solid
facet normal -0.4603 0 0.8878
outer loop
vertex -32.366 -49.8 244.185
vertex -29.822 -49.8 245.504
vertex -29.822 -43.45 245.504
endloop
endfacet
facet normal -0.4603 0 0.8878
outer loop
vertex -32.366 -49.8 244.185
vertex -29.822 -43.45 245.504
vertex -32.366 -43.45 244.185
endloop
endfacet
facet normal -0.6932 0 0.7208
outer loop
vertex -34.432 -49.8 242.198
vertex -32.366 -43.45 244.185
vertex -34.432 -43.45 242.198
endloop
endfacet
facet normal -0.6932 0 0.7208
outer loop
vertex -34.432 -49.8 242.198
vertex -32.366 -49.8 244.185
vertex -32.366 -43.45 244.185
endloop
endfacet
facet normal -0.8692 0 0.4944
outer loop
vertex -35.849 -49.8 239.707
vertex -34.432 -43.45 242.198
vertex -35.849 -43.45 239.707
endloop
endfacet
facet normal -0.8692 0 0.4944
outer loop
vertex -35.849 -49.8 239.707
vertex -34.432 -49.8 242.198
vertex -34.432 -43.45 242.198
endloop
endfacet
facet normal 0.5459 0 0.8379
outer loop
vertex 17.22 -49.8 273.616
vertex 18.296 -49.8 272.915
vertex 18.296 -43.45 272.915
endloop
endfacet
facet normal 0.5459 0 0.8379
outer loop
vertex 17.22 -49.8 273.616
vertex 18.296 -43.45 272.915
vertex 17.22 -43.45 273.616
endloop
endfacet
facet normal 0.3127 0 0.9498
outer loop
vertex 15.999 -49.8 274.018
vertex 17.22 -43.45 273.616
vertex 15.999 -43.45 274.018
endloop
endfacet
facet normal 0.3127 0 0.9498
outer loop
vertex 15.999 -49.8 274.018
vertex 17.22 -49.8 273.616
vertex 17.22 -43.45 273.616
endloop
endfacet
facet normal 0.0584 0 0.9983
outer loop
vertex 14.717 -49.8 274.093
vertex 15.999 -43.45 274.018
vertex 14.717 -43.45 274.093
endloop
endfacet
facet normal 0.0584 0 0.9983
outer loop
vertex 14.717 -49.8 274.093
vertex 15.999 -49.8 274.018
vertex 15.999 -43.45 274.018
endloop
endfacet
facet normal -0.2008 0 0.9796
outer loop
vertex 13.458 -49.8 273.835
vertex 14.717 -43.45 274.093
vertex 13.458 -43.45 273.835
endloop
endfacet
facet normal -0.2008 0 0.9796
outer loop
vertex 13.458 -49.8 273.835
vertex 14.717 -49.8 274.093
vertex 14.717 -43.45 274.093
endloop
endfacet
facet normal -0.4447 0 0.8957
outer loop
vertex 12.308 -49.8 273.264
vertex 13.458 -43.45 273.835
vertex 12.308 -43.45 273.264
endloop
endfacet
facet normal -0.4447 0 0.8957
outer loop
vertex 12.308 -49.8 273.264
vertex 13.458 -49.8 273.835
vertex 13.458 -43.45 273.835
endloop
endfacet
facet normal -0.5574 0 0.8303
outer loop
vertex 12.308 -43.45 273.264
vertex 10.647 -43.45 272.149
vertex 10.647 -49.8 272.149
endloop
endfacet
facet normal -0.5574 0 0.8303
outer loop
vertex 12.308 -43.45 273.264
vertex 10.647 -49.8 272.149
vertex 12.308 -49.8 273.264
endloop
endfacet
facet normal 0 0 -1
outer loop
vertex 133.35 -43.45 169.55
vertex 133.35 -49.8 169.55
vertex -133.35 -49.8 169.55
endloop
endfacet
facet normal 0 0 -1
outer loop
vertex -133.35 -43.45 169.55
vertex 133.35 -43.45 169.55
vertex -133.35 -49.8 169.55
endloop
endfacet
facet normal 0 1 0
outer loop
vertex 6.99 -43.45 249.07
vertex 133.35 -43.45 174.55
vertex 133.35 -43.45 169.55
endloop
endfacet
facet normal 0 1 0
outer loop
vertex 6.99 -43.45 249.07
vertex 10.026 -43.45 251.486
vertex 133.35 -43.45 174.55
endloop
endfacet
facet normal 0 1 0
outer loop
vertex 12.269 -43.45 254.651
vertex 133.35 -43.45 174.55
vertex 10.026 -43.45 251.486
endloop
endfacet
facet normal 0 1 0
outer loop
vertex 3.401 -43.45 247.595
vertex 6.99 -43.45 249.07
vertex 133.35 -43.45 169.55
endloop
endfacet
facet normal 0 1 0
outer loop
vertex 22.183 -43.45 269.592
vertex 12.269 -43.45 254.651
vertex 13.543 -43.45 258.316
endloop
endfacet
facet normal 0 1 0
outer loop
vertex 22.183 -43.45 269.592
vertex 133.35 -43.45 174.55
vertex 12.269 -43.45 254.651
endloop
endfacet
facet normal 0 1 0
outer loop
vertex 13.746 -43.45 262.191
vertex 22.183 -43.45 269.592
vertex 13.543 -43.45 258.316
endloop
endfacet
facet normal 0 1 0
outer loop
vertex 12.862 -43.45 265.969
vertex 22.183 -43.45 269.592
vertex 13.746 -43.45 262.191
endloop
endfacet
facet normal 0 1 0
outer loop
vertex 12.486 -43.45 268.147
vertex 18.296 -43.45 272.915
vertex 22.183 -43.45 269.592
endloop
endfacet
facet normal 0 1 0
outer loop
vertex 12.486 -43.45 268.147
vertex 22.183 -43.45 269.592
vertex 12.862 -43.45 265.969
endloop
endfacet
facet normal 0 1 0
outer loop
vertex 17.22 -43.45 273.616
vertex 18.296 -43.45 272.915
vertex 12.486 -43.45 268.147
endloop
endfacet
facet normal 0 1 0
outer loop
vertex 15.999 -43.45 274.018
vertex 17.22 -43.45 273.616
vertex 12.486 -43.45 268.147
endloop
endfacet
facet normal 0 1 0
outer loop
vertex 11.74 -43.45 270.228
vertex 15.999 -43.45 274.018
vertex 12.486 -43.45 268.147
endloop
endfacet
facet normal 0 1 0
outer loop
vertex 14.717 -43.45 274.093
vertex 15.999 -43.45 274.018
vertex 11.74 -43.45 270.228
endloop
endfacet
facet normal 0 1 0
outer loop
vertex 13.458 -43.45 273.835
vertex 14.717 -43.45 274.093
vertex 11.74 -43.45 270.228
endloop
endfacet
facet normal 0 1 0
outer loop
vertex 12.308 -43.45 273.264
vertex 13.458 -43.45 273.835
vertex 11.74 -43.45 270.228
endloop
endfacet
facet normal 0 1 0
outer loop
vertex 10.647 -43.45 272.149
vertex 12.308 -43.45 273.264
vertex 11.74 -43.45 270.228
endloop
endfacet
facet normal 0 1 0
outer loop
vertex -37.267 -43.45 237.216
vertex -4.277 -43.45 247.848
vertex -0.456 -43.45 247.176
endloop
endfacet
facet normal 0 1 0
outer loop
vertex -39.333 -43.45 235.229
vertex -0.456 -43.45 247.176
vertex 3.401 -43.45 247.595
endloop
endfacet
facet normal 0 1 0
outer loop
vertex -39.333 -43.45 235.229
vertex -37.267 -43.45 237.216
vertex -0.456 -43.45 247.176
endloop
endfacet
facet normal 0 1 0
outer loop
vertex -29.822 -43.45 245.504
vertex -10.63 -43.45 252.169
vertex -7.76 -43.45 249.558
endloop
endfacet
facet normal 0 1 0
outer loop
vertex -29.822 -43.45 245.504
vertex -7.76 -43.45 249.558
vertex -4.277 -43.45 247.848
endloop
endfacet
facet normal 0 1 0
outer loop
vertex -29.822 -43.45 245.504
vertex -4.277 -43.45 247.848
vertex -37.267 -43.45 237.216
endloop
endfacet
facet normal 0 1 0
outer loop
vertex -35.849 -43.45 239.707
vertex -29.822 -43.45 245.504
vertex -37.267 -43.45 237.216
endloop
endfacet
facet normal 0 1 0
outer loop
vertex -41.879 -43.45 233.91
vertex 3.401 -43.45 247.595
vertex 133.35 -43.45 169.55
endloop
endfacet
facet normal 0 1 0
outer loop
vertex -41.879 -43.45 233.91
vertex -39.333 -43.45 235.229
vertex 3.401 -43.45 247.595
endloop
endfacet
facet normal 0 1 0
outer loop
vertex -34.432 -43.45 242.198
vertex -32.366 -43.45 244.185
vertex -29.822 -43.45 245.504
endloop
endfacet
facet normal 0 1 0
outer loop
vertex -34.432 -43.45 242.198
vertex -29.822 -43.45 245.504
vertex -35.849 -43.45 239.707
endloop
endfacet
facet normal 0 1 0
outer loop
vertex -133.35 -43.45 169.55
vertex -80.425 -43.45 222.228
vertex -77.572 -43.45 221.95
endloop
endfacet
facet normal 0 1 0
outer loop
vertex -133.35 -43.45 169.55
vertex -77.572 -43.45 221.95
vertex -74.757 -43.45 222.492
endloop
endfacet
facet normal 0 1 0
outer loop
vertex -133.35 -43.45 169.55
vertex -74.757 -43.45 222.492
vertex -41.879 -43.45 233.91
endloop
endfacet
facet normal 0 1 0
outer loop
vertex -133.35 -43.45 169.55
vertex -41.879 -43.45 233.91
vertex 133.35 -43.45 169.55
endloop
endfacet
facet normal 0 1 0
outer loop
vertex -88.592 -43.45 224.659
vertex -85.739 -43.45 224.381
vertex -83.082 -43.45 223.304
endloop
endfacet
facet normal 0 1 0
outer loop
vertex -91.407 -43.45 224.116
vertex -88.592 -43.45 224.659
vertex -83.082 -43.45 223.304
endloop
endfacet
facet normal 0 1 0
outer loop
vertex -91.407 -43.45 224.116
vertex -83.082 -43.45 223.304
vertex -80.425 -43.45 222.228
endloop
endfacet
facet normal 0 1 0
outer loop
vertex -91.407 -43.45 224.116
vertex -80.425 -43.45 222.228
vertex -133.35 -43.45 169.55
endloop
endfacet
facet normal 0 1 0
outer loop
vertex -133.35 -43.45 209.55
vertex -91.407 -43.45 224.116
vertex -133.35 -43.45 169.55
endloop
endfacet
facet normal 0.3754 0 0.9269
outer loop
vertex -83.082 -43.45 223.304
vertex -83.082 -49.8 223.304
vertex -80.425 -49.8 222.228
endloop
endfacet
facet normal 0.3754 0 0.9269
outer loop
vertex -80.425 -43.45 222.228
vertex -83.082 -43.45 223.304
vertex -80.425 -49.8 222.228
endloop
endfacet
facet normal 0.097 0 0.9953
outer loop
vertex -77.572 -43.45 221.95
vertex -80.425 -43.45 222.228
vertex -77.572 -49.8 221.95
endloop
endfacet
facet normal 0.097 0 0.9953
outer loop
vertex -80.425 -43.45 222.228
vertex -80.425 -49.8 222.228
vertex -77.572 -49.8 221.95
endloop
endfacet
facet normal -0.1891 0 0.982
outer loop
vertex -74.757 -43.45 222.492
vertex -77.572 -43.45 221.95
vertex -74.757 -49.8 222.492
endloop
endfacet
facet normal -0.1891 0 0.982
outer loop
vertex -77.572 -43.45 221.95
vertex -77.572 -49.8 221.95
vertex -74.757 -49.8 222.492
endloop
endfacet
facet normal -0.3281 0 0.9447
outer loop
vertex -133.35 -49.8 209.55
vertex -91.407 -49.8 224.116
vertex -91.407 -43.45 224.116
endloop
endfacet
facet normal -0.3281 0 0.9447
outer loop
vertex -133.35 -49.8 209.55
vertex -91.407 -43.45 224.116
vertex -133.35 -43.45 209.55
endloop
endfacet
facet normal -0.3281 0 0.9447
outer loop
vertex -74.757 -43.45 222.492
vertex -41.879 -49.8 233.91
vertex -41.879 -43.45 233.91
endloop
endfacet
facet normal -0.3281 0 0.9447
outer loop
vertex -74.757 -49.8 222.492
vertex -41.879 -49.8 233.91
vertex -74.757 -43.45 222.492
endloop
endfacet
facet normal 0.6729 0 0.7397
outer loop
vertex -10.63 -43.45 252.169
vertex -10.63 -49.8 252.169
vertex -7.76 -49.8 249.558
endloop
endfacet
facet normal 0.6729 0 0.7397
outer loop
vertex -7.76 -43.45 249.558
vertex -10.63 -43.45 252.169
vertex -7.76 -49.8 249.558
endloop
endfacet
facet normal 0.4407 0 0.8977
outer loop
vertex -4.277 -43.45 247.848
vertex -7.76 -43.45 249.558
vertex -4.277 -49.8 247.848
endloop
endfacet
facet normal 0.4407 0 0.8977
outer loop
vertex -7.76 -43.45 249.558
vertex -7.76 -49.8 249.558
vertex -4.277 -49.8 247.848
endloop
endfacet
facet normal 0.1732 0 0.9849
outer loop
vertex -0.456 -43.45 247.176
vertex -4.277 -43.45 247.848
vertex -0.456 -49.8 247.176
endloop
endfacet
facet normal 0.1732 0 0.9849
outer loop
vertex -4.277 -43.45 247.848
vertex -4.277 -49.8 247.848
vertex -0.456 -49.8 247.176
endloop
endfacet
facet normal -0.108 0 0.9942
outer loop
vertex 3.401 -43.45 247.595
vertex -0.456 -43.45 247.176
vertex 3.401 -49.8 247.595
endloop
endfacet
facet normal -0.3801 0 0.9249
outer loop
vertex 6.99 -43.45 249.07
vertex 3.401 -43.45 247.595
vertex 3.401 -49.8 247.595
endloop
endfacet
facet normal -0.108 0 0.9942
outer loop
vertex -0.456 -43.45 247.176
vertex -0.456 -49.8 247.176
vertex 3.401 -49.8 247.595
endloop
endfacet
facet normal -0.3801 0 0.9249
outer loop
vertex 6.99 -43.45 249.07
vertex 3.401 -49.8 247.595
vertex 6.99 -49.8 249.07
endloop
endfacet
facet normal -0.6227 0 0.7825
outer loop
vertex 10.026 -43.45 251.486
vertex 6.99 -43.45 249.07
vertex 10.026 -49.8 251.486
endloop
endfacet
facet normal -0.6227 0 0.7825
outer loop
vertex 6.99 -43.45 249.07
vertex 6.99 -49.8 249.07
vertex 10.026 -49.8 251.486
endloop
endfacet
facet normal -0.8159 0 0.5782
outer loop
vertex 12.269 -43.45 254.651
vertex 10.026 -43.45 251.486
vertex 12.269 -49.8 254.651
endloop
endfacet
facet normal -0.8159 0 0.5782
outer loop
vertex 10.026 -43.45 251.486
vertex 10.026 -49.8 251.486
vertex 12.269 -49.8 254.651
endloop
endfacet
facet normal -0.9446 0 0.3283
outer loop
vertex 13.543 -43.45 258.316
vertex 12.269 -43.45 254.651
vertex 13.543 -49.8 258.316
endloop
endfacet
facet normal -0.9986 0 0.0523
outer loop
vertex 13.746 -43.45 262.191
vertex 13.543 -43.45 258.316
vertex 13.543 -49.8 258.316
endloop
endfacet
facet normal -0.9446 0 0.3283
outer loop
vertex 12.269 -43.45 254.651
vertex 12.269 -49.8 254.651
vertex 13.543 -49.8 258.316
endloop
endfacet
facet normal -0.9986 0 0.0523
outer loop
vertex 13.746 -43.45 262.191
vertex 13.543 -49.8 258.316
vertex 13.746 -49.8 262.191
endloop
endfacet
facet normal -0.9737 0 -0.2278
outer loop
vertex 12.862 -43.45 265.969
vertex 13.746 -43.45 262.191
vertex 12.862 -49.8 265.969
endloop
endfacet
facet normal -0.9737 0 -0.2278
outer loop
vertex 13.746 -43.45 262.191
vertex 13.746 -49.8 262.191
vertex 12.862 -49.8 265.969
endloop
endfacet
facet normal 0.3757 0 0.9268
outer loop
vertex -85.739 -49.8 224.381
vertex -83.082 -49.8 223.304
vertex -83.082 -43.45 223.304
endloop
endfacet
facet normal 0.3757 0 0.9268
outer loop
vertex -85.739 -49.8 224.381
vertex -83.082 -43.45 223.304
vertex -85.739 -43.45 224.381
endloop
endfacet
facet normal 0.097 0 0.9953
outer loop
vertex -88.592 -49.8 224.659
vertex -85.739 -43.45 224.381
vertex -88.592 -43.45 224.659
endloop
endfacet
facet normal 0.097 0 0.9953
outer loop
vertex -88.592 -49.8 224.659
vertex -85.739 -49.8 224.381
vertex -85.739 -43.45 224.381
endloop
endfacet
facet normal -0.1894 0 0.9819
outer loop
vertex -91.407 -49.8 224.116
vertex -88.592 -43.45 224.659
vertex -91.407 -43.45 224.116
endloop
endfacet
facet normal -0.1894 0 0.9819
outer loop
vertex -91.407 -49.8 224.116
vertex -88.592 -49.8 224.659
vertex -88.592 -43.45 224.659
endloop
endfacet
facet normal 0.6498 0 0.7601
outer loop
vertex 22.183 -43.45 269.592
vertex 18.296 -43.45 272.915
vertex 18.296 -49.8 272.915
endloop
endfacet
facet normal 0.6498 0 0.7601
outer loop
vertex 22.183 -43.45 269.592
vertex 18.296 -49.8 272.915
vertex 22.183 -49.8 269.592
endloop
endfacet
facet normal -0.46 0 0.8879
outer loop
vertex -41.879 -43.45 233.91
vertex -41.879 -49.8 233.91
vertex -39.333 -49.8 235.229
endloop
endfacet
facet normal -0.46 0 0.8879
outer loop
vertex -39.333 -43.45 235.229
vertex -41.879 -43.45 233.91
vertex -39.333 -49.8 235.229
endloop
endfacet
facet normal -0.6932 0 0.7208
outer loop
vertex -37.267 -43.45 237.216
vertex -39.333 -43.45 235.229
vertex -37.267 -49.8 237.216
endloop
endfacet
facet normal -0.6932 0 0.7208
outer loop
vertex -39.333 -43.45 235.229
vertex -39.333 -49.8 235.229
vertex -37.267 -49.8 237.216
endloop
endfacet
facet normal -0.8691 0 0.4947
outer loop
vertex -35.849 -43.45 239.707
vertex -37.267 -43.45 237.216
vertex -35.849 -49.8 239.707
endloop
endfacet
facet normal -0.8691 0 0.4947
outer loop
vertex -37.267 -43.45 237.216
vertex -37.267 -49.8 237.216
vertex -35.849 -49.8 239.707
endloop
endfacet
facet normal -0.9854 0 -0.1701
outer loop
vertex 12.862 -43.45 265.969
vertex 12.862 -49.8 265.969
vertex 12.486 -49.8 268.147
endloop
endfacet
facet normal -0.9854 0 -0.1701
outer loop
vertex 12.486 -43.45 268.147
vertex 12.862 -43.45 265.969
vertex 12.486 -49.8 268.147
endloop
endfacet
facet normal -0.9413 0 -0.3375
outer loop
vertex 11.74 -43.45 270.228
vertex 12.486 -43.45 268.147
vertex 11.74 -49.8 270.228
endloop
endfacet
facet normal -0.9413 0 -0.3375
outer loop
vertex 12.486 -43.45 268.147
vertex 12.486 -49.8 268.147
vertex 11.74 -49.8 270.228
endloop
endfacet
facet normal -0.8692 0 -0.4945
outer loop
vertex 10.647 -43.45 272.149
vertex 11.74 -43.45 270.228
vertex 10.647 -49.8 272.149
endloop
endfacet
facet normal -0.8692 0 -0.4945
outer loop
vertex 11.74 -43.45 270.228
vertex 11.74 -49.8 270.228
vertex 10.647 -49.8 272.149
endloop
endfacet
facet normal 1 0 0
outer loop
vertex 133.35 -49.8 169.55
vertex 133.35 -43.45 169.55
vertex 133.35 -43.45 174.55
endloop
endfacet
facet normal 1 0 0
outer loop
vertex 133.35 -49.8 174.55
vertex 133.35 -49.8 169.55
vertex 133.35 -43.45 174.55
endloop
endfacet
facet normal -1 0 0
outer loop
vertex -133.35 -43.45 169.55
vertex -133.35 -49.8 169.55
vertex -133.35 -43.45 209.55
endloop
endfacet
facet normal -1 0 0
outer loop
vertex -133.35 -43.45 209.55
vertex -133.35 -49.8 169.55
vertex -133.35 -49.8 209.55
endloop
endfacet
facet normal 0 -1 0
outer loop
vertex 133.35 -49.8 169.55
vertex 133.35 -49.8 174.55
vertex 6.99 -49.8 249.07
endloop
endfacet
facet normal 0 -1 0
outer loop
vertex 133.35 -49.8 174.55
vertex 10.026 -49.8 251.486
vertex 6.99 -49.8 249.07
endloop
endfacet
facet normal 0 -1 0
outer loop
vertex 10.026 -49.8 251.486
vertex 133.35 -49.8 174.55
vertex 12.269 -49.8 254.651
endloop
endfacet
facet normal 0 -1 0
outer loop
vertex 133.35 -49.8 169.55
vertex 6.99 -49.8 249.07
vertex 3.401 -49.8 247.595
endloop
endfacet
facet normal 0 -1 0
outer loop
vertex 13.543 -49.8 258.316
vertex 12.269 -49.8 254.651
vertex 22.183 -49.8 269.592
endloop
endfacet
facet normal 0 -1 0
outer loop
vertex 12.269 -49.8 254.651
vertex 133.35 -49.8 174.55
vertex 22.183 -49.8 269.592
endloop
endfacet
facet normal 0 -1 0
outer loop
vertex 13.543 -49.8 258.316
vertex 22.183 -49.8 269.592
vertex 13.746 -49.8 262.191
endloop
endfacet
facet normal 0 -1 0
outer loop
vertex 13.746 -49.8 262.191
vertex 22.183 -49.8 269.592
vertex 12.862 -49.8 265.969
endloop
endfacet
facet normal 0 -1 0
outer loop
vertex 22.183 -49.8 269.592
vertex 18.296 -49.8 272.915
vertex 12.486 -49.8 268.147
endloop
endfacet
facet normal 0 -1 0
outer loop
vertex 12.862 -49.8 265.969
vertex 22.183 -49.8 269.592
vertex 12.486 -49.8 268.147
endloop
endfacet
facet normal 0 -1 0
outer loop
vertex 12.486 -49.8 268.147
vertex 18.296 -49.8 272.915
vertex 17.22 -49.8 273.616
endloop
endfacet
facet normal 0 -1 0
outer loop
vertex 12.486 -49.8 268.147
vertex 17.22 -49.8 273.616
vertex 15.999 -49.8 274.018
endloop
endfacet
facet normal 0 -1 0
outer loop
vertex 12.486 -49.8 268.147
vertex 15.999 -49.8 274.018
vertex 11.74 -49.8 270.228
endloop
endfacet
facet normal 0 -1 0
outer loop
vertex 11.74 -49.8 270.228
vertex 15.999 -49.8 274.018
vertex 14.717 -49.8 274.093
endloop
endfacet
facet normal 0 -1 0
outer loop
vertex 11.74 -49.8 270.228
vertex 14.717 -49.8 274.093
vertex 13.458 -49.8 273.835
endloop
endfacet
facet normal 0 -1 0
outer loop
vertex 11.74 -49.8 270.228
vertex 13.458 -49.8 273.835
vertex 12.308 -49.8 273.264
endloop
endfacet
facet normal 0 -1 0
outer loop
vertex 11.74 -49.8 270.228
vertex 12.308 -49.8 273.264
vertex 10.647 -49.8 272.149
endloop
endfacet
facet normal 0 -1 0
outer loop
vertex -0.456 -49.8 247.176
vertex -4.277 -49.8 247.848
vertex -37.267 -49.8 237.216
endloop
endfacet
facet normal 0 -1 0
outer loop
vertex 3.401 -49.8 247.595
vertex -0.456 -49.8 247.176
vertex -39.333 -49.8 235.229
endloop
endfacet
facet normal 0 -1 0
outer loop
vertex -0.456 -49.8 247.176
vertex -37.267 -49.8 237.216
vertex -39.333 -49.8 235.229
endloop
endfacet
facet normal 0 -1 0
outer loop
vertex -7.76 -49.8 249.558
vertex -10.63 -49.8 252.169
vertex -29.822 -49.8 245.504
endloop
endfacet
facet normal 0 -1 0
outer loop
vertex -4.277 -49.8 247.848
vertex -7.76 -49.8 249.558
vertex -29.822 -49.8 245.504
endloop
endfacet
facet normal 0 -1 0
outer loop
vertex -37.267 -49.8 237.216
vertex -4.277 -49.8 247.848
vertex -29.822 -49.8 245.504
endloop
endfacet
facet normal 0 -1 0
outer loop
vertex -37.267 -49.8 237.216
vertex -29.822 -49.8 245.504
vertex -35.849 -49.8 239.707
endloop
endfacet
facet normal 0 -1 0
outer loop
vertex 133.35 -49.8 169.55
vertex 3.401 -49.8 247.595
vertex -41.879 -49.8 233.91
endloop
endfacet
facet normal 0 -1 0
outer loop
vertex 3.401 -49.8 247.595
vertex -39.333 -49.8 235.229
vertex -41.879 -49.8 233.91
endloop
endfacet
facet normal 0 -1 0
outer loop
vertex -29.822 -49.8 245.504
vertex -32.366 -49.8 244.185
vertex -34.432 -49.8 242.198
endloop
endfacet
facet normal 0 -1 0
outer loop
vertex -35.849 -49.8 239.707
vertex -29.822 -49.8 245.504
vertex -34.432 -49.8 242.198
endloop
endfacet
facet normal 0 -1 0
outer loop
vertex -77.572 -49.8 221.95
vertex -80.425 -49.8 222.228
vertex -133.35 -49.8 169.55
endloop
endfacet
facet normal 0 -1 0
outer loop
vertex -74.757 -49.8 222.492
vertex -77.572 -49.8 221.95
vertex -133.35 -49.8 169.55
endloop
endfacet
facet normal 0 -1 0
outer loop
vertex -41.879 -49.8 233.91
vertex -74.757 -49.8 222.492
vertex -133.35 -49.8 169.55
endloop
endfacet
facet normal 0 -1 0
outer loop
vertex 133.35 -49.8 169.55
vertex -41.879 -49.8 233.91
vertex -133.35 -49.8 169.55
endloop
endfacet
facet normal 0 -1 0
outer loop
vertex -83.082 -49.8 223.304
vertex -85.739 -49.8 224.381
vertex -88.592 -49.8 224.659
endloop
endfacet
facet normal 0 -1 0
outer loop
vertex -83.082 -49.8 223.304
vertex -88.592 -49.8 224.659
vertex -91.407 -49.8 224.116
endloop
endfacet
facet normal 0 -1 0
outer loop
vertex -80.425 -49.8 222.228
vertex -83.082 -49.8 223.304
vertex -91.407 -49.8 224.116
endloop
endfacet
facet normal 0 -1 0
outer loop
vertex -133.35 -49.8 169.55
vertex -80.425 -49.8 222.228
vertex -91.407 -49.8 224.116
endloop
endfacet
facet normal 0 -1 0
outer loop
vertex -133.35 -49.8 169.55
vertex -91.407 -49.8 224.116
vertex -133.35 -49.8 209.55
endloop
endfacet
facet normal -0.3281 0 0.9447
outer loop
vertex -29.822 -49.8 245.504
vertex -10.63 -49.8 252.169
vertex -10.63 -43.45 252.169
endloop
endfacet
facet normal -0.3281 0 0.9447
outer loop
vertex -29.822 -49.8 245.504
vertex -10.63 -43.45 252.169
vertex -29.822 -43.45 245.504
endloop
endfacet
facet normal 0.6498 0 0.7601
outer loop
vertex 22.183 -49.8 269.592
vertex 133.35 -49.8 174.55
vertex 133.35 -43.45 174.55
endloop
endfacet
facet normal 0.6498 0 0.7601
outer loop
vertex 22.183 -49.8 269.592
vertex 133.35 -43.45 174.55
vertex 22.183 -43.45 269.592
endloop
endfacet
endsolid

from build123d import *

# Parameters (mm, degrees)
PAD005_DEPTH    = 6.35
SKETCH014_W     = 3.141259
SKETCH014_H     = 4.397751
PAD011_DEPTH    = 6.35
SKETCH015_W     = 9.97554
SKETCH015_H     = 9.591858
PAD012_DEPTH    = 6.35
POCKET001_DEPTH = 6.35
PAD016_DEPTH    = 6.35


with BuildPart() as part:
    # Sketch006 (on Face1 of ShapeBinder007) → Pad005 (new body)
    with BuildSketch(Plane.XZ.offset(49.8)):
        with BuildLine():
            Line((133.35, 169.55), (-133.35, 169.55))
            Line((-133.35, 169.55), (-133.35, 209.55))
            Line((-10.630146, 252.168791), (-133.35, 209.55))
            ThreePointArc((-10.630146, 252.168791), (6.989684, 249.06987), (12.862348, 265.968791))
            Line((12.862348, 265.968791), (22.18289, 269.591979))
            Line((133.35, 174.55), (22.18289, 269.591979))
            Line((133.35, 169.55), (133.35, 174.55))
        make_face()
    extrude(amount=-PAD005_DEPTH)

    # Sketch014 (on Face8 of Pad005) → Pad011 (join)
    with BuildSketch(Plane.XZ.offset(49.8)):
        with Locations((-75.779384, 200.48986)):
            Rectangle(SKETCH014_W, SKETCH014_H)
    extrude(amount=-PAD011_DEPTH)

    # Sketch015 (on Face8 of Pad011) → Pad012 (join)
    with BuildSketch(Plane.XZ.offset(49.8)):
        with Locations((45.684311, 201.652512)):
            Rectangle(SKETCH015_W, SKETCH015_H)
    extrude(amount=-PAD012_DEPTH)

    # Sketch050 (on Face8 of Pad012) → Pocket001 (cut)
    with BuildSketch(Plane.XZ.offset(49.8)):
        with BuildLine():
            ThreePointArc((-83.081656, 223.304195), (-87.155196, 224.622491), (-91.406711, 224.116284))
            Line((-91.406711, 224.116284), (-93.047035, 228.83956))
            Line((-93.047035, 228.83956), (-31.459503, 250.228))
            Line((-31.459503, 250.228), (-29.819179, 245.504724))
            ThreePointArc((-29.819179, 245.504724), (-33.469298, 243.26681), (-35.848895, 239.707435))
            ThreePointArc((-41.878611, 233.910146), (-38.228492, 236.14806), (-35.848895, 239.707435))
            Line((-41.878611, 233.910146), (-74.756601, 222.492106))
            ThreePointArc((-83.081656, 223.304195), (-79.008116, 221.985899), (-74.756601, 222.492106))
        make_face()
    extrude(amount=-POCKET001_DEPTH, mode=Mode.SUBTRACT)

    # Sketch051 (on Face4 of Pocket001) → Pad016 (join)
    with BuildSketch(Plane.XZ.offset(49.8)):
        with BuildLine():
            ThreePointArc((12.862348, 265.968791), (12.157812, 269.203321), (10.647338, 272.149))
            Line((10.647338, 272.149), (12.307973, 273.263581))
            ThreePointArc((18.295876, 272.91517), (15.360549, 274.096912), (12.307973, 273.263581))
            Line((18.295876, 272.91517), (22.18289, 269.591979))
            Line((22.18289, 269.591979), (12.862348, 265.968791))
        make_face()
    extrude(amount=-PAD016_DEPTH)


solid = part.part
